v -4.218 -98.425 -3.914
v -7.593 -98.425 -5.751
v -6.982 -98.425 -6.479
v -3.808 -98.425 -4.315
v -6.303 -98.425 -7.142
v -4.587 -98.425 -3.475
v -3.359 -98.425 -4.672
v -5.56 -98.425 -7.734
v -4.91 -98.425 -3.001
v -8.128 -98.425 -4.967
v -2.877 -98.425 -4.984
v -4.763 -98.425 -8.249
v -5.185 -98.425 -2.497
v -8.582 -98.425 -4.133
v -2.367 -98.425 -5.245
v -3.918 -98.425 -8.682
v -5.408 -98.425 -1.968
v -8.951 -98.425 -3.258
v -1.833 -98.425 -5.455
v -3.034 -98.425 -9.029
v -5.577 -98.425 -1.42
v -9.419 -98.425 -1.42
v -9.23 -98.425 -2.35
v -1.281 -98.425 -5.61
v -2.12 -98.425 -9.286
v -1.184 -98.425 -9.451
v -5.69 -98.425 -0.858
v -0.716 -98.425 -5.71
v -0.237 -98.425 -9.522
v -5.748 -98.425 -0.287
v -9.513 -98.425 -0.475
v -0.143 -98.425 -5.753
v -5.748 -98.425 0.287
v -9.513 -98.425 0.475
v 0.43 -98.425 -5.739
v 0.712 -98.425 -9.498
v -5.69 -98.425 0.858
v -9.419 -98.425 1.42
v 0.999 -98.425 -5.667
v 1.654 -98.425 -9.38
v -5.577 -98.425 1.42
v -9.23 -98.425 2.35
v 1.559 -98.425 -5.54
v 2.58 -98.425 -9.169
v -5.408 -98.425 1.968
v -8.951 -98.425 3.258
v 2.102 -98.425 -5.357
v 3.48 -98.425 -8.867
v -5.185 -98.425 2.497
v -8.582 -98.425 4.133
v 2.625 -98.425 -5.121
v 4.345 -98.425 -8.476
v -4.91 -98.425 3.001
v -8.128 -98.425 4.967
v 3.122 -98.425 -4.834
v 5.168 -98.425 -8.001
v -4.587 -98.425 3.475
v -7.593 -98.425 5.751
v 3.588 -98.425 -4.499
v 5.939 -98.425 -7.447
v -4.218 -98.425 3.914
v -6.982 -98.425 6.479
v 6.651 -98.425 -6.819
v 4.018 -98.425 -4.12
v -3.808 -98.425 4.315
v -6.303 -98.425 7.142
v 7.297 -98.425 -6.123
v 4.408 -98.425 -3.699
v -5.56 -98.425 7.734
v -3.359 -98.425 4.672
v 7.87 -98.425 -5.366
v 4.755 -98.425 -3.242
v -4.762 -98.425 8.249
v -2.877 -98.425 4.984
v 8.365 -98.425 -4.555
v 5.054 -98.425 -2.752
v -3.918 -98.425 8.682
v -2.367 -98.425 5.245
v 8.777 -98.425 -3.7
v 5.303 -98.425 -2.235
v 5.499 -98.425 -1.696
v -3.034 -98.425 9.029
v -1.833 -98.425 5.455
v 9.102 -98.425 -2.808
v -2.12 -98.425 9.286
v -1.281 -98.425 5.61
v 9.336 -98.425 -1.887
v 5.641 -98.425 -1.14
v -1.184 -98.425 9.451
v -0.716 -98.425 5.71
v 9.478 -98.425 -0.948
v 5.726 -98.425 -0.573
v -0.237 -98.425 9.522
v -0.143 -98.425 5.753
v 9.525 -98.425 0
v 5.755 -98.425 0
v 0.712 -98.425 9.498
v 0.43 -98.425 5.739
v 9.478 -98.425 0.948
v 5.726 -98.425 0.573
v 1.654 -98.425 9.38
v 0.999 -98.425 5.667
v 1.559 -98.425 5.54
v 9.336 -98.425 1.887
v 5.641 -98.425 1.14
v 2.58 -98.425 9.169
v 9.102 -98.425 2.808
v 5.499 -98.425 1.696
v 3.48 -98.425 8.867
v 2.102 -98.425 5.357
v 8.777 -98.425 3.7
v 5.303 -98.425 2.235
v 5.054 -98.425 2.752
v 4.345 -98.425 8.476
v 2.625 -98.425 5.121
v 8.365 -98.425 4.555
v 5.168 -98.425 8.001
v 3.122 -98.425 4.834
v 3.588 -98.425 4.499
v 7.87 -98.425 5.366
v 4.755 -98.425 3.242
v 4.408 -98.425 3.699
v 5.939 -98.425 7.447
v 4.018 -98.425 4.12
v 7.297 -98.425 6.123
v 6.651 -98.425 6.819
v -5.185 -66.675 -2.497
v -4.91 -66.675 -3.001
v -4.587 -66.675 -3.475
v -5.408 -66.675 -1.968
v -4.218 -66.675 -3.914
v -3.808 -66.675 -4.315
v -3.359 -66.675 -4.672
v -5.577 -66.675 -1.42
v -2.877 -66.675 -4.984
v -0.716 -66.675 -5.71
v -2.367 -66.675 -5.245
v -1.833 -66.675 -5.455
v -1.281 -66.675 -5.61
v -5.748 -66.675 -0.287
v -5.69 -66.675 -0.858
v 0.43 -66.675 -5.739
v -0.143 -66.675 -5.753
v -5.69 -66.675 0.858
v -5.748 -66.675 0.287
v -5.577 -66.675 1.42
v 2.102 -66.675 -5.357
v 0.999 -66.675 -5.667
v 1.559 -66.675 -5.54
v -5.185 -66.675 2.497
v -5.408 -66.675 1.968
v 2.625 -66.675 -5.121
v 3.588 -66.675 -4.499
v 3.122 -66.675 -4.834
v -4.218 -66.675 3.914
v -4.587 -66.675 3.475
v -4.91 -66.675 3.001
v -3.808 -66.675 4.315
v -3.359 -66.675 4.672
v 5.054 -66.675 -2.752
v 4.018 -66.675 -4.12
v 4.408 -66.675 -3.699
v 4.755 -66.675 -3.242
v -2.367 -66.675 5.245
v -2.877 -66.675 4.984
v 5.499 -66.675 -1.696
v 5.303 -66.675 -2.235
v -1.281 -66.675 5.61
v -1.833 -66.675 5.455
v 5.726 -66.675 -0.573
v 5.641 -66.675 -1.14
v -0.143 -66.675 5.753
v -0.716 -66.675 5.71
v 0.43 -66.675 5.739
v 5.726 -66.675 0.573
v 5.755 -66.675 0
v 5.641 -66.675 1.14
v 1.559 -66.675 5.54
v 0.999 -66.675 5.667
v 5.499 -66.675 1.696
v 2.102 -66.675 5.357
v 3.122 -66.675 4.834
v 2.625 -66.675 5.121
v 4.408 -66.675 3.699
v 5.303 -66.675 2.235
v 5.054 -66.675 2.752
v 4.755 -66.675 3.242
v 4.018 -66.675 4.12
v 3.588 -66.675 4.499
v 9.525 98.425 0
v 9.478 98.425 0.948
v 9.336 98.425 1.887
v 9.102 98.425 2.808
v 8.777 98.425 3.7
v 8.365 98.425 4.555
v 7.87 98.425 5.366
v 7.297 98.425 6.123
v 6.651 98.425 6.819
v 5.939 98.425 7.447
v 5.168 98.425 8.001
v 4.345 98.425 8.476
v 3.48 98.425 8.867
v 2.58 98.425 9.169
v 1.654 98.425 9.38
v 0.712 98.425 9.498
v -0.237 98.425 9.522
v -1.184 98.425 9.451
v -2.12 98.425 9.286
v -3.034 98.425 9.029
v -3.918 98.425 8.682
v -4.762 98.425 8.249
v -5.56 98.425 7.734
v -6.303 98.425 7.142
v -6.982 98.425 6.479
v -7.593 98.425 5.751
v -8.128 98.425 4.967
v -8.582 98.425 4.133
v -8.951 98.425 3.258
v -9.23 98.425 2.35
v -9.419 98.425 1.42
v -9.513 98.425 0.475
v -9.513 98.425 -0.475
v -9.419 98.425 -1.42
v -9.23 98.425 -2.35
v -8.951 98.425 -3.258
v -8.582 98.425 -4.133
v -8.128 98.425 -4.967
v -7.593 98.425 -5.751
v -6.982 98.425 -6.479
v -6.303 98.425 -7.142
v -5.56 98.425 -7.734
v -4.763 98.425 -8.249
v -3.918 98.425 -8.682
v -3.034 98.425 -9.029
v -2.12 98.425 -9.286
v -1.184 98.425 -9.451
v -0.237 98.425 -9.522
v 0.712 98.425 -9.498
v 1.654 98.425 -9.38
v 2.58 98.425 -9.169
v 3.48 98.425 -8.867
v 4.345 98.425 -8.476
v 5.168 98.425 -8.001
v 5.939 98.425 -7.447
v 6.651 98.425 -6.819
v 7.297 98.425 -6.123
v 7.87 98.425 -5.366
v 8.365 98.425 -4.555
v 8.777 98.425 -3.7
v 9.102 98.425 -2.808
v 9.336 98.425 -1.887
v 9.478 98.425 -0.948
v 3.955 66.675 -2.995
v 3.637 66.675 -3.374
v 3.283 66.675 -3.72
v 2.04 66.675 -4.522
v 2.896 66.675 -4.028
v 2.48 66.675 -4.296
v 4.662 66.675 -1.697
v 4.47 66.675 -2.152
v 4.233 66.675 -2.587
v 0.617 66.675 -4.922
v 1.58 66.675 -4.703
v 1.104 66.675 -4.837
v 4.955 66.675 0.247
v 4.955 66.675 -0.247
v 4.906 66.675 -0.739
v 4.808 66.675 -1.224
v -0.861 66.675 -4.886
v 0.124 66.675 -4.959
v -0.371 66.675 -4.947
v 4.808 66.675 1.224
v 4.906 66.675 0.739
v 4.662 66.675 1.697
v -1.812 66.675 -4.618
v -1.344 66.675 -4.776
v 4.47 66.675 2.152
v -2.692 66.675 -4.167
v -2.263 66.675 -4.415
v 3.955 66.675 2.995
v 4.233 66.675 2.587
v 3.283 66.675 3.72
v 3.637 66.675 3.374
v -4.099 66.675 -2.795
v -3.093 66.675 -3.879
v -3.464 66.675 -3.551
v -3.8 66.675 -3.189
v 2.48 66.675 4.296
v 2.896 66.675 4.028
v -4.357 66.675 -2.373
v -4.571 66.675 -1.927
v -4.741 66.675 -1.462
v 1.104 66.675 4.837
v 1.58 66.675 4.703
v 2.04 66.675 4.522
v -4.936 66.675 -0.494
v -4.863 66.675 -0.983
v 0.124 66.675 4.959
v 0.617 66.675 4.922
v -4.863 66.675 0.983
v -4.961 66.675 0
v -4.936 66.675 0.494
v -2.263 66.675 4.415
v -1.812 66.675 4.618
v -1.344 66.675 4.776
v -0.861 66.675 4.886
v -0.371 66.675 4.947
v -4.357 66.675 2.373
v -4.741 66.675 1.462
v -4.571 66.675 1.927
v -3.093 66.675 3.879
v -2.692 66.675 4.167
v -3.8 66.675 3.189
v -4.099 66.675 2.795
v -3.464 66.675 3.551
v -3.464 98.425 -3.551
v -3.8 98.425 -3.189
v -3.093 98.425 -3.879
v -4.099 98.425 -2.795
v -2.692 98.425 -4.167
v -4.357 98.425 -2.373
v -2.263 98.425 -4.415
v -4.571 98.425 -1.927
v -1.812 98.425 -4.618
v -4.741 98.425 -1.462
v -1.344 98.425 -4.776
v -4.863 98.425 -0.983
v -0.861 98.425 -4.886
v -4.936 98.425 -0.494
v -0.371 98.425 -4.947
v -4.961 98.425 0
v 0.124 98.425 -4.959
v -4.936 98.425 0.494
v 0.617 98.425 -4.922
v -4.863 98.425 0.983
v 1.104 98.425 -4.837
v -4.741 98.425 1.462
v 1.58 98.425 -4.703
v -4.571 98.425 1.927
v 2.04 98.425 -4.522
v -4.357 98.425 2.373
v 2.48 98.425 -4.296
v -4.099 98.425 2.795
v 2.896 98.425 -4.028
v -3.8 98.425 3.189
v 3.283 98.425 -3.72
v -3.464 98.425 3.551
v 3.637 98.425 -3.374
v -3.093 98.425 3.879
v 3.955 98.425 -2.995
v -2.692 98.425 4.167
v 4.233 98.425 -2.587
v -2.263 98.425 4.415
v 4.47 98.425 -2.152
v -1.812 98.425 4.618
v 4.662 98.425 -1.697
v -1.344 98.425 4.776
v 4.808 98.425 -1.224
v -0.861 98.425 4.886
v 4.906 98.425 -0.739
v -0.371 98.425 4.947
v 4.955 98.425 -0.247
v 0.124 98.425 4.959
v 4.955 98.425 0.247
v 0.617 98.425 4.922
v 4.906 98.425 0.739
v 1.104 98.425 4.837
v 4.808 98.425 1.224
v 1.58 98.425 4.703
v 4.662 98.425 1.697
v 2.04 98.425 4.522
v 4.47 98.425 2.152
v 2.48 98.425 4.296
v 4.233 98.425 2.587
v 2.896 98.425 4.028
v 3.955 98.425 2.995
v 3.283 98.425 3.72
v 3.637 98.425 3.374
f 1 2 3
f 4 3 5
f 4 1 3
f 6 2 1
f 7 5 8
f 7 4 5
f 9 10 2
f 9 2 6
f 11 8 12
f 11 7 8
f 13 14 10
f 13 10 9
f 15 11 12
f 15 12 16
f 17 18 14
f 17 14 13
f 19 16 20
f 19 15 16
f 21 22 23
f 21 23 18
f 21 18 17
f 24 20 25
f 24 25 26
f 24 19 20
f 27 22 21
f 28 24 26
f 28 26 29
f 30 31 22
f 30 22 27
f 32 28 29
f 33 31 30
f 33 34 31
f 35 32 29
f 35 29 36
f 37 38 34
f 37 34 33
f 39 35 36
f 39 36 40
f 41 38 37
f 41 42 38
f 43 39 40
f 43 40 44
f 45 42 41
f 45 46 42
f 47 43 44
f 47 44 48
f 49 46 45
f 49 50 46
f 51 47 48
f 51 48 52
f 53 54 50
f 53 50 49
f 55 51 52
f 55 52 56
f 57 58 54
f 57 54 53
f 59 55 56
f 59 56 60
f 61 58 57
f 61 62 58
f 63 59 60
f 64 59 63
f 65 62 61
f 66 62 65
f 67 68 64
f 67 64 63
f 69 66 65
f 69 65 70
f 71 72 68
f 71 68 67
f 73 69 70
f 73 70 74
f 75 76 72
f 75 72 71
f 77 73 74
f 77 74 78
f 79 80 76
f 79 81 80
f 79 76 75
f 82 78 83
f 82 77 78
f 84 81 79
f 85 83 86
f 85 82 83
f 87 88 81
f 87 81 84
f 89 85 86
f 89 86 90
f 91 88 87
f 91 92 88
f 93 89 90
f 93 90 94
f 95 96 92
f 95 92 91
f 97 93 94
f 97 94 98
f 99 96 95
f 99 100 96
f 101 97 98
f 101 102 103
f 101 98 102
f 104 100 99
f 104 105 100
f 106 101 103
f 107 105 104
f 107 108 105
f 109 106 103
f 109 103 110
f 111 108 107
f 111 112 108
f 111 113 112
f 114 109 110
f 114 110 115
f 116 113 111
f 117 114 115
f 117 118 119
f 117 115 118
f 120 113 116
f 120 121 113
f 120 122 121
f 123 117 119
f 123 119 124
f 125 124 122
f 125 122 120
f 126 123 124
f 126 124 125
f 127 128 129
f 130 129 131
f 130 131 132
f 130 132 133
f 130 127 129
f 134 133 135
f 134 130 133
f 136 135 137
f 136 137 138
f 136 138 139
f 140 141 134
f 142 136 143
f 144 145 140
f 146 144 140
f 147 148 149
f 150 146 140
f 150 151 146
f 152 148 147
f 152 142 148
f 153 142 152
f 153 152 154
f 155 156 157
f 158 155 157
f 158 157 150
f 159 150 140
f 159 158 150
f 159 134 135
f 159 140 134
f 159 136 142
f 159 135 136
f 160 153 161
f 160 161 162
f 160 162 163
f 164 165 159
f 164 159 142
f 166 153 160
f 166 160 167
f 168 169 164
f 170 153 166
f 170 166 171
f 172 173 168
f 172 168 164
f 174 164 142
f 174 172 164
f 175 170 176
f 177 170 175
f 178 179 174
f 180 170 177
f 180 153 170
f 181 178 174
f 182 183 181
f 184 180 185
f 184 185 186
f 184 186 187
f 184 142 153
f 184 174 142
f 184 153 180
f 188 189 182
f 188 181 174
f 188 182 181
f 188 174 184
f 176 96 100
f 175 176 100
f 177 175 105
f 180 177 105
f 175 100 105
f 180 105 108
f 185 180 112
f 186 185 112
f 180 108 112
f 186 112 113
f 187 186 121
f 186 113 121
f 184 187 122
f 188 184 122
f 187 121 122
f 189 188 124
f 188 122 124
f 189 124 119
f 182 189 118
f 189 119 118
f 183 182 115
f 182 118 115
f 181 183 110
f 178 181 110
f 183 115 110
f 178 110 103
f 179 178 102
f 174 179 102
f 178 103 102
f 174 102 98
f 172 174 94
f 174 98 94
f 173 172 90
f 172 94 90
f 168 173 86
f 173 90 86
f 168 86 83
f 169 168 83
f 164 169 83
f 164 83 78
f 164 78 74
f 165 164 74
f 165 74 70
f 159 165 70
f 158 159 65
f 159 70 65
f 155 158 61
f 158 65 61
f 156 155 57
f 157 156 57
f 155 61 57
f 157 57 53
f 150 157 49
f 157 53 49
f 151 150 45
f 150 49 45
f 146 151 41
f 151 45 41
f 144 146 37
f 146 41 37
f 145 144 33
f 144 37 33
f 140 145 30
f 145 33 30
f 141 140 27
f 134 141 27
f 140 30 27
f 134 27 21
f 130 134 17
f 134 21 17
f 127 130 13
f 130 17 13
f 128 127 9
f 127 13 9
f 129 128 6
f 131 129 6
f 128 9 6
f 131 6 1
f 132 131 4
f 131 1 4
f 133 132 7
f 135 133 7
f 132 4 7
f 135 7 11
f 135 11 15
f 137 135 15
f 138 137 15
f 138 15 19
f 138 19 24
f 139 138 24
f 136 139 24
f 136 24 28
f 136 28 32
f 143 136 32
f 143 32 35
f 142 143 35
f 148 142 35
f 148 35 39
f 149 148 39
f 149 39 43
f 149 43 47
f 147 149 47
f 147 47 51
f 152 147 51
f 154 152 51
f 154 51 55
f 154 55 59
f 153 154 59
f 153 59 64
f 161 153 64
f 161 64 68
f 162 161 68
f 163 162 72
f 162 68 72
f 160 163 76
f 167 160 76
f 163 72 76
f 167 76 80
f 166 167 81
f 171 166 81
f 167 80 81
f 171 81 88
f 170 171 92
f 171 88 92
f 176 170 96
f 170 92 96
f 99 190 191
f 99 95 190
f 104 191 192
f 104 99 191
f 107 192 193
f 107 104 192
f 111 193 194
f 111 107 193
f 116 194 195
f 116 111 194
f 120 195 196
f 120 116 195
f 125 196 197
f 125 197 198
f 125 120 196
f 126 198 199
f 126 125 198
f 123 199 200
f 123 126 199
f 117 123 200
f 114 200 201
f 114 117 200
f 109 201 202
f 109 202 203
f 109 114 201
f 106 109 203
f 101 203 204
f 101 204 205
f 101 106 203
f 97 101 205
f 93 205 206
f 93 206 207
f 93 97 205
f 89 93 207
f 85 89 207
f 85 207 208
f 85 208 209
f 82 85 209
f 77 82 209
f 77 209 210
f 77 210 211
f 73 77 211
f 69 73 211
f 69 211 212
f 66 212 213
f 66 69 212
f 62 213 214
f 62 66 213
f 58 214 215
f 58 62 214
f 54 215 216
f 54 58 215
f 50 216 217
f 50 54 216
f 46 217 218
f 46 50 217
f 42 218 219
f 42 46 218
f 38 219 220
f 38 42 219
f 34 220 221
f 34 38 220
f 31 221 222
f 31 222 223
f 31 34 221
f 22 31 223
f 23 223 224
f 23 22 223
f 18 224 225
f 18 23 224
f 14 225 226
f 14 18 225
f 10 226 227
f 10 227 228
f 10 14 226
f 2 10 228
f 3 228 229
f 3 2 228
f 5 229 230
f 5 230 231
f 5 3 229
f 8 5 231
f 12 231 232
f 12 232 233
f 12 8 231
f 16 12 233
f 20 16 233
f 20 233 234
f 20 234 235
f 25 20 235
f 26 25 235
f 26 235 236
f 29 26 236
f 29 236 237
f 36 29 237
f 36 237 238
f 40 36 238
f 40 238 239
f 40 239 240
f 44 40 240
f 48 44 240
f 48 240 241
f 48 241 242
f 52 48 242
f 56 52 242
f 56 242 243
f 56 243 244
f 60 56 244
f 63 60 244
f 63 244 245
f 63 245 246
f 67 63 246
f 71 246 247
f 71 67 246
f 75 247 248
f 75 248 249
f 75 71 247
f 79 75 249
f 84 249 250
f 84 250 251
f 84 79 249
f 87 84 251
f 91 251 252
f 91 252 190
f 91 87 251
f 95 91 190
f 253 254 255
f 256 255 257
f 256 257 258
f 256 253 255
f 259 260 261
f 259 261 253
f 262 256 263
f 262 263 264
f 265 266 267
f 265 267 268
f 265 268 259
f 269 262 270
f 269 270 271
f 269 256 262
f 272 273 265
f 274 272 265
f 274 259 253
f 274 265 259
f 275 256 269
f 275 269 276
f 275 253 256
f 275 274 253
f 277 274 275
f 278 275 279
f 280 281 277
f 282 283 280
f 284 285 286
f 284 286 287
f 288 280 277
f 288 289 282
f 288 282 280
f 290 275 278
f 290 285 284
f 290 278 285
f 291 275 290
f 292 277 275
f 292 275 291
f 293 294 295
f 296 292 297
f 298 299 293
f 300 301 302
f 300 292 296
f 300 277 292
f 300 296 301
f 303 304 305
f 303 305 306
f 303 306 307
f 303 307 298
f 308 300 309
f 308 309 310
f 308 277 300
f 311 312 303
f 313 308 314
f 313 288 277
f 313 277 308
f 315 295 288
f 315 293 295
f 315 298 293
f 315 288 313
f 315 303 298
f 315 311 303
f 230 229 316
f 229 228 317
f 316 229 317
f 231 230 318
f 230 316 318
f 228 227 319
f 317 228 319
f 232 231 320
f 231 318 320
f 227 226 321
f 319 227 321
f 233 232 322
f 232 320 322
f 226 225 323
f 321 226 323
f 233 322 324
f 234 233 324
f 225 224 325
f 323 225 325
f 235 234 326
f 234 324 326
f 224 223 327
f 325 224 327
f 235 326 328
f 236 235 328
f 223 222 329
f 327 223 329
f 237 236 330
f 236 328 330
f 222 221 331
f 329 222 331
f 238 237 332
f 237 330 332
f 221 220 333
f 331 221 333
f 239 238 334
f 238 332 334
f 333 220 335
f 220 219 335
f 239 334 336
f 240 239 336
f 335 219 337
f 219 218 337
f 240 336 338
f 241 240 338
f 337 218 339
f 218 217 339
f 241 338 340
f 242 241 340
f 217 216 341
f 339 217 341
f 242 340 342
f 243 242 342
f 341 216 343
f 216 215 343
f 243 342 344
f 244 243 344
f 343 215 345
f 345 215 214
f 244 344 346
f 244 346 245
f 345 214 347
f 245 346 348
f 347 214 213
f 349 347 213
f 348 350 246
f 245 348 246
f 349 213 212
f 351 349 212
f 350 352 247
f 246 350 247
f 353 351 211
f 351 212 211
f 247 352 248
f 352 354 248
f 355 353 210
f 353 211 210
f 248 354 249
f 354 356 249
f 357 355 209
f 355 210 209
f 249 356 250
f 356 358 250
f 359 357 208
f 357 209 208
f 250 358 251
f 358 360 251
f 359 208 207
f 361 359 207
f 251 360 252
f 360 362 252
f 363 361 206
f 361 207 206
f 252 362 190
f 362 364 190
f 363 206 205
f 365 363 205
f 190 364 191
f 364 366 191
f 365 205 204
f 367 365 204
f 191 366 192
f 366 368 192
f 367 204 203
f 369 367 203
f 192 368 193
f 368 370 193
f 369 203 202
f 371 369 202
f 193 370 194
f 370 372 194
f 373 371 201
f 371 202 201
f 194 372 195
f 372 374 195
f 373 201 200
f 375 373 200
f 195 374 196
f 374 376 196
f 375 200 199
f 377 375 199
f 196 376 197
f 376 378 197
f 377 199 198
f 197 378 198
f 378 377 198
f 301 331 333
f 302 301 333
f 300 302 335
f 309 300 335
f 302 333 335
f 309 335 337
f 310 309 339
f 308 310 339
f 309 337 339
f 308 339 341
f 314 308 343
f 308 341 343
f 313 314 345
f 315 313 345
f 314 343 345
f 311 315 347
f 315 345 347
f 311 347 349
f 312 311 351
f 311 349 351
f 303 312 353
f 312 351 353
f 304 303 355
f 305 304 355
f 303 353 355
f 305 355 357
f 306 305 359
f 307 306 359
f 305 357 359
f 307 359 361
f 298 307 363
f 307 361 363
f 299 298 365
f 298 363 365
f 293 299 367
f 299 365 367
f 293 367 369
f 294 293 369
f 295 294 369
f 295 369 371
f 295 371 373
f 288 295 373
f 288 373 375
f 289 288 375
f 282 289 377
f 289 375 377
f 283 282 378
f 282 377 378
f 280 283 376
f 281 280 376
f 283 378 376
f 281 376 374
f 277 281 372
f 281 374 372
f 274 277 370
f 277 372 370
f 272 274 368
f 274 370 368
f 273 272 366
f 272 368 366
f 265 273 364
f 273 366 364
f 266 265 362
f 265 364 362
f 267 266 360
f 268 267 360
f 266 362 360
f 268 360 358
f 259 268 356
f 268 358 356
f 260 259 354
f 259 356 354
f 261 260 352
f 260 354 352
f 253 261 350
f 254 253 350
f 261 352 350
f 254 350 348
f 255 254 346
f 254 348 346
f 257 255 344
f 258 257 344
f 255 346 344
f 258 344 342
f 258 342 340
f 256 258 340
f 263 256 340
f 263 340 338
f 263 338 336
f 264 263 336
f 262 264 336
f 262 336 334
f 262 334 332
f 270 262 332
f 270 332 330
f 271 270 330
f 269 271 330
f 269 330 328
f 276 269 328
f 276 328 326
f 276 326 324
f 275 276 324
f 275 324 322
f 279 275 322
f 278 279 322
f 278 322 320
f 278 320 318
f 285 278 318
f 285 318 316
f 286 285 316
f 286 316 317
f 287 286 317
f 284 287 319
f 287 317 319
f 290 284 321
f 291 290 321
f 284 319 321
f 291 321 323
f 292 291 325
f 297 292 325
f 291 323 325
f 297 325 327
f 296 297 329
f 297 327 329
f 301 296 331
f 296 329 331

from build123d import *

# Parameters (mm, degrees)
F0_R     = 9.525
F1_DEPTH = 98.425
F2_R     = 5.754688
F3_DEPTH = 31.75
F4_R     = 4.960938
F5_DEPTH = 31.75


with BuildPart() as f1:
    # F0 (on Front) → F1 (new body, symmetric)
    with BuildSketch(Plane.XZ):
        Circle(F0_R)
    extrude(amount=F1_DEPTH, both=True)

    # F2 (on face) → F3 (cut)
    with BuildSketch(Plane.XZ.offset(98.425)):
        Circle(F2_R)
    extrude(amount=-F3_DEPTH, mode=Mode.SUBTRACT)

    # F4 (on face) → F5 (cut)
    with BuildSketch(Plane(origin=(0, 98.425, 0), x_dir=(-1, 0, 0), z_dir=(0, 1, 0))):
        Circle(F4_R)
    extrude(amount=-F5_DEPTH, mode=Mode.SUBTRACT)


solid = f1.part
